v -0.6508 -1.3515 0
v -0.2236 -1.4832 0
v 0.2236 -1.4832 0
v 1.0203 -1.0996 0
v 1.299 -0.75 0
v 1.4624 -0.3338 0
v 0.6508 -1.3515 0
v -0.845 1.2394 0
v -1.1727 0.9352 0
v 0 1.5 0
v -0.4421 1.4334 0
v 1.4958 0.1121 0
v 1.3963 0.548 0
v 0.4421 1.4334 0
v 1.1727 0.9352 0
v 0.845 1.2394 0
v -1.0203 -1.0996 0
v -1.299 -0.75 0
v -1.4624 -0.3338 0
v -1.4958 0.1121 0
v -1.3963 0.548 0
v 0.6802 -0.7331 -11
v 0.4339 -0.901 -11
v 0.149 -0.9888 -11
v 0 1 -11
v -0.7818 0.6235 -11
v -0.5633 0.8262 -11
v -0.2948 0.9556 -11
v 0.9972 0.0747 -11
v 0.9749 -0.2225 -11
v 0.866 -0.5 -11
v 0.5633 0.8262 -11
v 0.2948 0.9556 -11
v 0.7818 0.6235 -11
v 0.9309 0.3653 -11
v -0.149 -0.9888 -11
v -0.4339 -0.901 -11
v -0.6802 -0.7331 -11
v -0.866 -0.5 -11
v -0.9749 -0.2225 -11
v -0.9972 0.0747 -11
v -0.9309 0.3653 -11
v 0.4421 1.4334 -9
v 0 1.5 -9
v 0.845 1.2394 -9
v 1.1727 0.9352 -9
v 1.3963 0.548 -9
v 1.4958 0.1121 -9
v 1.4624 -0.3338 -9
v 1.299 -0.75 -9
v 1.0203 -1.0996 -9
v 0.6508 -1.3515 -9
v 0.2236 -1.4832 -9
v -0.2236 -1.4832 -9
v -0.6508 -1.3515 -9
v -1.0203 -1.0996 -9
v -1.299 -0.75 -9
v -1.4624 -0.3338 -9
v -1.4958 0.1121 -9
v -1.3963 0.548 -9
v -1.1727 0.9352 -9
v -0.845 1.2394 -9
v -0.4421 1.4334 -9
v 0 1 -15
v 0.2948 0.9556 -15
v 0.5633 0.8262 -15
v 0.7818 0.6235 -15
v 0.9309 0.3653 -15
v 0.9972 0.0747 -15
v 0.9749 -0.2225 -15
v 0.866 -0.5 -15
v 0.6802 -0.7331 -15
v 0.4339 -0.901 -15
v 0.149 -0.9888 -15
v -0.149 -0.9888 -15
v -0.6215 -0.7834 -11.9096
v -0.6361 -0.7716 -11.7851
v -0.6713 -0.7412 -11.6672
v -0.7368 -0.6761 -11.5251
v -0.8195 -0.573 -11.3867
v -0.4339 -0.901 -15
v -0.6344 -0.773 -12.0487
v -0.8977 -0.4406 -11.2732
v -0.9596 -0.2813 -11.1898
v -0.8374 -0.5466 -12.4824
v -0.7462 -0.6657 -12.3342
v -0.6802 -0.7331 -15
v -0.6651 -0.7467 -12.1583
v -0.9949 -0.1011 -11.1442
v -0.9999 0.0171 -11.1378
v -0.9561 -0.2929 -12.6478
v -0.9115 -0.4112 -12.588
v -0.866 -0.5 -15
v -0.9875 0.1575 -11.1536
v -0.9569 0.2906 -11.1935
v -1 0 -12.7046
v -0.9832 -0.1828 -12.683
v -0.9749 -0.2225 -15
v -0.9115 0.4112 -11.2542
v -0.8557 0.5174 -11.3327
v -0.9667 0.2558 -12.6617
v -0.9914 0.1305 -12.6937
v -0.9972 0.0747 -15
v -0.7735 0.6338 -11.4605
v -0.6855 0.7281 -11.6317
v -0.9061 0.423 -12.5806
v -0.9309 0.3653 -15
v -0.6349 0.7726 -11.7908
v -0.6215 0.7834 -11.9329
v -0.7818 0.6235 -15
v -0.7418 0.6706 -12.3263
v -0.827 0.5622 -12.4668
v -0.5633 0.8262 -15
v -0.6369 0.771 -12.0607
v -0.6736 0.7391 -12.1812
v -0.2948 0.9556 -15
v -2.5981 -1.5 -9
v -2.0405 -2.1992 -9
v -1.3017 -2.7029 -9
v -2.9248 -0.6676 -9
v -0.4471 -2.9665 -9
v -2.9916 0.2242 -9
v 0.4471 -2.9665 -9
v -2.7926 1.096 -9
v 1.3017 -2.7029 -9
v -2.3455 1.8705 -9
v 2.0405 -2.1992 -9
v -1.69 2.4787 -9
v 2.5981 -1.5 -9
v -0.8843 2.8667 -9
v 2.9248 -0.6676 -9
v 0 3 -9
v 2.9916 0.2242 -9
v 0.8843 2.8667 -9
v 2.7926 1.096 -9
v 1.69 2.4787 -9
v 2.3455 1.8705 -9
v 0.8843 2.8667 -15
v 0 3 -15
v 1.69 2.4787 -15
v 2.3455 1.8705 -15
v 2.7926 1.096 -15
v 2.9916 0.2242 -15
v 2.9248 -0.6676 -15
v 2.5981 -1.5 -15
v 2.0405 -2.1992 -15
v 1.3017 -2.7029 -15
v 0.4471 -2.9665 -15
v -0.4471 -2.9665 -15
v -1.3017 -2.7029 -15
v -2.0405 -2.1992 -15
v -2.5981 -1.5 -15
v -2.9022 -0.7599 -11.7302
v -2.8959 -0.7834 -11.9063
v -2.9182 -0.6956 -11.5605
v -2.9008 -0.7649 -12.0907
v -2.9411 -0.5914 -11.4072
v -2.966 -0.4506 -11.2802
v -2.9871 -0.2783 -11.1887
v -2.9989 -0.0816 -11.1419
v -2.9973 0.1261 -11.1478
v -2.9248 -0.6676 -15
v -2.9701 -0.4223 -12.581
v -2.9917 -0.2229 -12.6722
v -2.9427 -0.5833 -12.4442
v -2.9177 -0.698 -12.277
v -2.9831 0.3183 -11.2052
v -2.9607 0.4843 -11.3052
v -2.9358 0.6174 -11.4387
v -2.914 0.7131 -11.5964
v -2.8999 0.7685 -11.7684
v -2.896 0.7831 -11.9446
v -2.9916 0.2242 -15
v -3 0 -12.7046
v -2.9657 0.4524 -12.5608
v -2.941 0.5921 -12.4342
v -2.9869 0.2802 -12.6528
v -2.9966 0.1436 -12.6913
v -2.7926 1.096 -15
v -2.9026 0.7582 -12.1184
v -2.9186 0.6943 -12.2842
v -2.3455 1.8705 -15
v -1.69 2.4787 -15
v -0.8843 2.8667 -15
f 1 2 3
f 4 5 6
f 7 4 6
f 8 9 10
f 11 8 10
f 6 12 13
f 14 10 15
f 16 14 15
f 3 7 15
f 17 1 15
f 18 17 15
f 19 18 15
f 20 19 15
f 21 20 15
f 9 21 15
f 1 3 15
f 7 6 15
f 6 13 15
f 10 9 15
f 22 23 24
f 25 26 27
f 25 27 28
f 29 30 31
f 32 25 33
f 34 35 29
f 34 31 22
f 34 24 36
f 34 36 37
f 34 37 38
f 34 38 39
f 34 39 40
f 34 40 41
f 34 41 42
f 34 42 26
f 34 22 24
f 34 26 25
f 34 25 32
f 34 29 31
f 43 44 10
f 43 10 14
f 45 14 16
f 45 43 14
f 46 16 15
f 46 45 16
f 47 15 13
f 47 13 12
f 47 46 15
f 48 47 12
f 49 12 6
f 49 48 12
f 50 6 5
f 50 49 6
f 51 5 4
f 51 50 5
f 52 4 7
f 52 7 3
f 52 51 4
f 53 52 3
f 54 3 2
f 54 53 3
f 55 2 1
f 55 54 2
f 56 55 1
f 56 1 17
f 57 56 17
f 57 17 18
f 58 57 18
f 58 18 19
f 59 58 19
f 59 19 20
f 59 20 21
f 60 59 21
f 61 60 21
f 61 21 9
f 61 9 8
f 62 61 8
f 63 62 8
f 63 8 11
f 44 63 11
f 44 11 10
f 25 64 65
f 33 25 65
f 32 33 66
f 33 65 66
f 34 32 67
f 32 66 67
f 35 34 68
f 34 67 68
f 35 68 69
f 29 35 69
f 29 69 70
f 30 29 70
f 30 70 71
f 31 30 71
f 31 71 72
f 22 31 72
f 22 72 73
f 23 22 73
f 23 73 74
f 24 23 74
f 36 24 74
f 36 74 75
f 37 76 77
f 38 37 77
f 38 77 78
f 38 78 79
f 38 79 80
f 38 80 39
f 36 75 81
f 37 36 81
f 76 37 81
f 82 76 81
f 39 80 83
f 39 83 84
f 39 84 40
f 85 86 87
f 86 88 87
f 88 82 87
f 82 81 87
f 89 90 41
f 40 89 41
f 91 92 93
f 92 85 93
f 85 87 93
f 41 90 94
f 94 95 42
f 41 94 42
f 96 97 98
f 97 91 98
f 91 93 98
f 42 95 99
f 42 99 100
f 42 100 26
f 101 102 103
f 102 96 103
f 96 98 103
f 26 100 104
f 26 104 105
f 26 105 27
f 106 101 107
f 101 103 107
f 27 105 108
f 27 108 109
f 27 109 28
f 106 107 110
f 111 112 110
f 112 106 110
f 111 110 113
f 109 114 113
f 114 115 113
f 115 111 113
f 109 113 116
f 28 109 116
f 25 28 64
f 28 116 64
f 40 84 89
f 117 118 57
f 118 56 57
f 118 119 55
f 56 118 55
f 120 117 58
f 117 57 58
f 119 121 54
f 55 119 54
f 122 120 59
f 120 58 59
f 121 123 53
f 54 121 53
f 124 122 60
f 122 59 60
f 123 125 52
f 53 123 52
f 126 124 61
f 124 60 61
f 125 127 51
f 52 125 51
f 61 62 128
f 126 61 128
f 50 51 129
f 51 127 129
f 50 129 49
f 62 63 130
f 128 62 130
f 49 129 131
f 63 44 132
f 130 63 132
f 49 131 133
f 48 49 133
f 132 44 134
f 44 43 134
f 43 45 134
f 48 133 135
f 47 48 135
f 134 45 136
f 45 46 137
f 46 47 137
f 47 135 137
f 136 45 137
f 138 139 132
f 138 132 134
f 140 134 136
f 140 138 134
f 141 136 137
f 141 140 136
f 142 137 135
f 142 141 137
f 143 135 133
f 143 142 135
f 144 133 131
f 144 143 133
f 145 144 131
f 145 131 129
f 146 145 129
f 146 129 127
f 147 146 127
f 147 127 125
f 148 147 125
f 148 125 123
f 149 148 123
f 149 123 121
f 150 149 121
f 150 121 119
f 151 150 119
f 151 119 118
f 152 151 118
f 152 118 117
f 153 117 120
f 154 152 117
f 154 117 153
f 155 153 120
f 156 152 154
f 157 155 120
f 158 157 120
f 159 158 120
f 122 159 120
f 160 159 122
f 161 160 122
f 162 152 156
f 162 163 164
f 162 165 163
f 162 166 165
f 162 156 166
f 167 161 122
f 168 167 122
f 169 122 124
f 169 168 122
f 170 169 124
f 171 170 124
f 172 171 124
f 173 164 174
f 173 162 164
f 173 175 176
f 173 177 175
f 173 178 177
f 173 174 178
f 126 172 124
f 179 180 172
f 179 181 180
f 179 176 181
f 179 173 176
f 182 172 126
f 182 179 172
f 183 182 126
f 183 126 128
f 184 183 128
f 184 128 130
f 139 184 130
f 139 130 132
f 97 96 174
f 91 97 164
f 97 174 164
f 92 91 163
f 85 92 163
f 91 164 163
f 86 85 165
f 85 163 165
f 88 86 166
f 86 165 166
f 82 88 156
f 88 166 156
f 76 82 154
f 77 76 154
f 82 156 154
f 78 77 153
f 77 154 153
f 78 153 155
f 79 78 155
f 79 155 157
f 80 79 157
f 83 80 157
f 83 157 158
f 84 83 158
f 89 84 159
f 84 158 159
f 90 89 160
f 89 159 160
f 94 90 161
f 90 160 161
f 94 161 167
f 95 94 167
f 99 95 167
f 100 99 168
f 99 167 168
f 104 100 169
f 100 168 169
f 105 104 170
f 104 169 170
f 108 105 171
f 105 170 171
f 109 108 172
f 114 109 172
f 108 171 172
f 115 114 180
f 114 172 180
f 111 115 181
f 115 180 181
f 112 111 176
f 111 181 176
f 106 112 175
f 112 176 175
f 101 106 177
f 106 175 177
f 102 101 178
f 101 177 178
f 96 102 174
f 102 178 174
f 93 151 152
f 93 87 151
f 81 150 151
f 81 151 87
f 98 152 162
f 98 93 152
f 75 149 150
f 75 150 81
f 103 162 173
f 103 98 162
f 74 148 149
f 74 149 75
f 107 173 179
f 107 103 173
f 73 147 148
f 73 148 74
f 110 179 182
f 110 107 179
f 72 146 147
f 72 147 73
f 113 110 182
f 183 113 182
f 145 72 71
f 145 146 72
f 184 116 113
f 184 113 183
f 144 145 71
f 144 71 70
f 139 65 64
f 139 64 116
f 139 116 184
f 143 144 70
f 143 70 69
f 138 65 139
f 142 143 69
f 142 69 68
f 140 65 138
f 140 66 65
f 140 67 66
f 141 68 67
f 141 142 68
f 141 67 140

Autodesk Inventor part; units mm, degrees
ref_plane "YZ Plane" through (0, 0, 0) normal (1, 0, 0) x (0, 1, 0)
ref_plane "XZ Plane" through (0, 0, 0) normal (0, 1, 0) x (-1, 0, 0)
ref_plane "XY Plane" through (0, 0, 0) normal (0, 0, 1) x (1, 0, 0)
sketch "スケッチ1" plane through (0, 0, 0) normal (1, 0, 0) x (0, 1, 0)
  line L0 (0, 0) -> (1.5, 0)
  line L1 (1.5, 0) -> (1.5, -9)
  line L2 (1.5, -9) -> (3, -9)
  line L3 (3, -9) -> (3, -15)
  line L4 (3, -15) -> (1, -15)
  line L5 (0, 0) -> (0, -11)
  line L6 (0, -11) -> (1, -11)
  line L7 (1, -11) -> (1, -15)
  dimension "d0" = 1.5
  dimension "d1" = 1
  dimension "d2" = 9
  dimension "d3" = 4
  dimension "d4" = 2
  dimension "d5" = 2
revolve "回転1" add sketch "スケッチ1" angle 360 about axis through (0, 0, 0) along (0, 0, -1)
sketch "スケッチ2" plane through (0, 0, 0) normal (1, 0, 0) x (0, 1, 0)
  point P0 (0, 0)
  point P1 (0, -11.9211)
hole "穴1" at (0, 0, -11.9211) direction (-1, 0, 0) diameter 1.567 end through all thread size "M2x0.4" class "6H" standard "ANSI Metric M Profile"
